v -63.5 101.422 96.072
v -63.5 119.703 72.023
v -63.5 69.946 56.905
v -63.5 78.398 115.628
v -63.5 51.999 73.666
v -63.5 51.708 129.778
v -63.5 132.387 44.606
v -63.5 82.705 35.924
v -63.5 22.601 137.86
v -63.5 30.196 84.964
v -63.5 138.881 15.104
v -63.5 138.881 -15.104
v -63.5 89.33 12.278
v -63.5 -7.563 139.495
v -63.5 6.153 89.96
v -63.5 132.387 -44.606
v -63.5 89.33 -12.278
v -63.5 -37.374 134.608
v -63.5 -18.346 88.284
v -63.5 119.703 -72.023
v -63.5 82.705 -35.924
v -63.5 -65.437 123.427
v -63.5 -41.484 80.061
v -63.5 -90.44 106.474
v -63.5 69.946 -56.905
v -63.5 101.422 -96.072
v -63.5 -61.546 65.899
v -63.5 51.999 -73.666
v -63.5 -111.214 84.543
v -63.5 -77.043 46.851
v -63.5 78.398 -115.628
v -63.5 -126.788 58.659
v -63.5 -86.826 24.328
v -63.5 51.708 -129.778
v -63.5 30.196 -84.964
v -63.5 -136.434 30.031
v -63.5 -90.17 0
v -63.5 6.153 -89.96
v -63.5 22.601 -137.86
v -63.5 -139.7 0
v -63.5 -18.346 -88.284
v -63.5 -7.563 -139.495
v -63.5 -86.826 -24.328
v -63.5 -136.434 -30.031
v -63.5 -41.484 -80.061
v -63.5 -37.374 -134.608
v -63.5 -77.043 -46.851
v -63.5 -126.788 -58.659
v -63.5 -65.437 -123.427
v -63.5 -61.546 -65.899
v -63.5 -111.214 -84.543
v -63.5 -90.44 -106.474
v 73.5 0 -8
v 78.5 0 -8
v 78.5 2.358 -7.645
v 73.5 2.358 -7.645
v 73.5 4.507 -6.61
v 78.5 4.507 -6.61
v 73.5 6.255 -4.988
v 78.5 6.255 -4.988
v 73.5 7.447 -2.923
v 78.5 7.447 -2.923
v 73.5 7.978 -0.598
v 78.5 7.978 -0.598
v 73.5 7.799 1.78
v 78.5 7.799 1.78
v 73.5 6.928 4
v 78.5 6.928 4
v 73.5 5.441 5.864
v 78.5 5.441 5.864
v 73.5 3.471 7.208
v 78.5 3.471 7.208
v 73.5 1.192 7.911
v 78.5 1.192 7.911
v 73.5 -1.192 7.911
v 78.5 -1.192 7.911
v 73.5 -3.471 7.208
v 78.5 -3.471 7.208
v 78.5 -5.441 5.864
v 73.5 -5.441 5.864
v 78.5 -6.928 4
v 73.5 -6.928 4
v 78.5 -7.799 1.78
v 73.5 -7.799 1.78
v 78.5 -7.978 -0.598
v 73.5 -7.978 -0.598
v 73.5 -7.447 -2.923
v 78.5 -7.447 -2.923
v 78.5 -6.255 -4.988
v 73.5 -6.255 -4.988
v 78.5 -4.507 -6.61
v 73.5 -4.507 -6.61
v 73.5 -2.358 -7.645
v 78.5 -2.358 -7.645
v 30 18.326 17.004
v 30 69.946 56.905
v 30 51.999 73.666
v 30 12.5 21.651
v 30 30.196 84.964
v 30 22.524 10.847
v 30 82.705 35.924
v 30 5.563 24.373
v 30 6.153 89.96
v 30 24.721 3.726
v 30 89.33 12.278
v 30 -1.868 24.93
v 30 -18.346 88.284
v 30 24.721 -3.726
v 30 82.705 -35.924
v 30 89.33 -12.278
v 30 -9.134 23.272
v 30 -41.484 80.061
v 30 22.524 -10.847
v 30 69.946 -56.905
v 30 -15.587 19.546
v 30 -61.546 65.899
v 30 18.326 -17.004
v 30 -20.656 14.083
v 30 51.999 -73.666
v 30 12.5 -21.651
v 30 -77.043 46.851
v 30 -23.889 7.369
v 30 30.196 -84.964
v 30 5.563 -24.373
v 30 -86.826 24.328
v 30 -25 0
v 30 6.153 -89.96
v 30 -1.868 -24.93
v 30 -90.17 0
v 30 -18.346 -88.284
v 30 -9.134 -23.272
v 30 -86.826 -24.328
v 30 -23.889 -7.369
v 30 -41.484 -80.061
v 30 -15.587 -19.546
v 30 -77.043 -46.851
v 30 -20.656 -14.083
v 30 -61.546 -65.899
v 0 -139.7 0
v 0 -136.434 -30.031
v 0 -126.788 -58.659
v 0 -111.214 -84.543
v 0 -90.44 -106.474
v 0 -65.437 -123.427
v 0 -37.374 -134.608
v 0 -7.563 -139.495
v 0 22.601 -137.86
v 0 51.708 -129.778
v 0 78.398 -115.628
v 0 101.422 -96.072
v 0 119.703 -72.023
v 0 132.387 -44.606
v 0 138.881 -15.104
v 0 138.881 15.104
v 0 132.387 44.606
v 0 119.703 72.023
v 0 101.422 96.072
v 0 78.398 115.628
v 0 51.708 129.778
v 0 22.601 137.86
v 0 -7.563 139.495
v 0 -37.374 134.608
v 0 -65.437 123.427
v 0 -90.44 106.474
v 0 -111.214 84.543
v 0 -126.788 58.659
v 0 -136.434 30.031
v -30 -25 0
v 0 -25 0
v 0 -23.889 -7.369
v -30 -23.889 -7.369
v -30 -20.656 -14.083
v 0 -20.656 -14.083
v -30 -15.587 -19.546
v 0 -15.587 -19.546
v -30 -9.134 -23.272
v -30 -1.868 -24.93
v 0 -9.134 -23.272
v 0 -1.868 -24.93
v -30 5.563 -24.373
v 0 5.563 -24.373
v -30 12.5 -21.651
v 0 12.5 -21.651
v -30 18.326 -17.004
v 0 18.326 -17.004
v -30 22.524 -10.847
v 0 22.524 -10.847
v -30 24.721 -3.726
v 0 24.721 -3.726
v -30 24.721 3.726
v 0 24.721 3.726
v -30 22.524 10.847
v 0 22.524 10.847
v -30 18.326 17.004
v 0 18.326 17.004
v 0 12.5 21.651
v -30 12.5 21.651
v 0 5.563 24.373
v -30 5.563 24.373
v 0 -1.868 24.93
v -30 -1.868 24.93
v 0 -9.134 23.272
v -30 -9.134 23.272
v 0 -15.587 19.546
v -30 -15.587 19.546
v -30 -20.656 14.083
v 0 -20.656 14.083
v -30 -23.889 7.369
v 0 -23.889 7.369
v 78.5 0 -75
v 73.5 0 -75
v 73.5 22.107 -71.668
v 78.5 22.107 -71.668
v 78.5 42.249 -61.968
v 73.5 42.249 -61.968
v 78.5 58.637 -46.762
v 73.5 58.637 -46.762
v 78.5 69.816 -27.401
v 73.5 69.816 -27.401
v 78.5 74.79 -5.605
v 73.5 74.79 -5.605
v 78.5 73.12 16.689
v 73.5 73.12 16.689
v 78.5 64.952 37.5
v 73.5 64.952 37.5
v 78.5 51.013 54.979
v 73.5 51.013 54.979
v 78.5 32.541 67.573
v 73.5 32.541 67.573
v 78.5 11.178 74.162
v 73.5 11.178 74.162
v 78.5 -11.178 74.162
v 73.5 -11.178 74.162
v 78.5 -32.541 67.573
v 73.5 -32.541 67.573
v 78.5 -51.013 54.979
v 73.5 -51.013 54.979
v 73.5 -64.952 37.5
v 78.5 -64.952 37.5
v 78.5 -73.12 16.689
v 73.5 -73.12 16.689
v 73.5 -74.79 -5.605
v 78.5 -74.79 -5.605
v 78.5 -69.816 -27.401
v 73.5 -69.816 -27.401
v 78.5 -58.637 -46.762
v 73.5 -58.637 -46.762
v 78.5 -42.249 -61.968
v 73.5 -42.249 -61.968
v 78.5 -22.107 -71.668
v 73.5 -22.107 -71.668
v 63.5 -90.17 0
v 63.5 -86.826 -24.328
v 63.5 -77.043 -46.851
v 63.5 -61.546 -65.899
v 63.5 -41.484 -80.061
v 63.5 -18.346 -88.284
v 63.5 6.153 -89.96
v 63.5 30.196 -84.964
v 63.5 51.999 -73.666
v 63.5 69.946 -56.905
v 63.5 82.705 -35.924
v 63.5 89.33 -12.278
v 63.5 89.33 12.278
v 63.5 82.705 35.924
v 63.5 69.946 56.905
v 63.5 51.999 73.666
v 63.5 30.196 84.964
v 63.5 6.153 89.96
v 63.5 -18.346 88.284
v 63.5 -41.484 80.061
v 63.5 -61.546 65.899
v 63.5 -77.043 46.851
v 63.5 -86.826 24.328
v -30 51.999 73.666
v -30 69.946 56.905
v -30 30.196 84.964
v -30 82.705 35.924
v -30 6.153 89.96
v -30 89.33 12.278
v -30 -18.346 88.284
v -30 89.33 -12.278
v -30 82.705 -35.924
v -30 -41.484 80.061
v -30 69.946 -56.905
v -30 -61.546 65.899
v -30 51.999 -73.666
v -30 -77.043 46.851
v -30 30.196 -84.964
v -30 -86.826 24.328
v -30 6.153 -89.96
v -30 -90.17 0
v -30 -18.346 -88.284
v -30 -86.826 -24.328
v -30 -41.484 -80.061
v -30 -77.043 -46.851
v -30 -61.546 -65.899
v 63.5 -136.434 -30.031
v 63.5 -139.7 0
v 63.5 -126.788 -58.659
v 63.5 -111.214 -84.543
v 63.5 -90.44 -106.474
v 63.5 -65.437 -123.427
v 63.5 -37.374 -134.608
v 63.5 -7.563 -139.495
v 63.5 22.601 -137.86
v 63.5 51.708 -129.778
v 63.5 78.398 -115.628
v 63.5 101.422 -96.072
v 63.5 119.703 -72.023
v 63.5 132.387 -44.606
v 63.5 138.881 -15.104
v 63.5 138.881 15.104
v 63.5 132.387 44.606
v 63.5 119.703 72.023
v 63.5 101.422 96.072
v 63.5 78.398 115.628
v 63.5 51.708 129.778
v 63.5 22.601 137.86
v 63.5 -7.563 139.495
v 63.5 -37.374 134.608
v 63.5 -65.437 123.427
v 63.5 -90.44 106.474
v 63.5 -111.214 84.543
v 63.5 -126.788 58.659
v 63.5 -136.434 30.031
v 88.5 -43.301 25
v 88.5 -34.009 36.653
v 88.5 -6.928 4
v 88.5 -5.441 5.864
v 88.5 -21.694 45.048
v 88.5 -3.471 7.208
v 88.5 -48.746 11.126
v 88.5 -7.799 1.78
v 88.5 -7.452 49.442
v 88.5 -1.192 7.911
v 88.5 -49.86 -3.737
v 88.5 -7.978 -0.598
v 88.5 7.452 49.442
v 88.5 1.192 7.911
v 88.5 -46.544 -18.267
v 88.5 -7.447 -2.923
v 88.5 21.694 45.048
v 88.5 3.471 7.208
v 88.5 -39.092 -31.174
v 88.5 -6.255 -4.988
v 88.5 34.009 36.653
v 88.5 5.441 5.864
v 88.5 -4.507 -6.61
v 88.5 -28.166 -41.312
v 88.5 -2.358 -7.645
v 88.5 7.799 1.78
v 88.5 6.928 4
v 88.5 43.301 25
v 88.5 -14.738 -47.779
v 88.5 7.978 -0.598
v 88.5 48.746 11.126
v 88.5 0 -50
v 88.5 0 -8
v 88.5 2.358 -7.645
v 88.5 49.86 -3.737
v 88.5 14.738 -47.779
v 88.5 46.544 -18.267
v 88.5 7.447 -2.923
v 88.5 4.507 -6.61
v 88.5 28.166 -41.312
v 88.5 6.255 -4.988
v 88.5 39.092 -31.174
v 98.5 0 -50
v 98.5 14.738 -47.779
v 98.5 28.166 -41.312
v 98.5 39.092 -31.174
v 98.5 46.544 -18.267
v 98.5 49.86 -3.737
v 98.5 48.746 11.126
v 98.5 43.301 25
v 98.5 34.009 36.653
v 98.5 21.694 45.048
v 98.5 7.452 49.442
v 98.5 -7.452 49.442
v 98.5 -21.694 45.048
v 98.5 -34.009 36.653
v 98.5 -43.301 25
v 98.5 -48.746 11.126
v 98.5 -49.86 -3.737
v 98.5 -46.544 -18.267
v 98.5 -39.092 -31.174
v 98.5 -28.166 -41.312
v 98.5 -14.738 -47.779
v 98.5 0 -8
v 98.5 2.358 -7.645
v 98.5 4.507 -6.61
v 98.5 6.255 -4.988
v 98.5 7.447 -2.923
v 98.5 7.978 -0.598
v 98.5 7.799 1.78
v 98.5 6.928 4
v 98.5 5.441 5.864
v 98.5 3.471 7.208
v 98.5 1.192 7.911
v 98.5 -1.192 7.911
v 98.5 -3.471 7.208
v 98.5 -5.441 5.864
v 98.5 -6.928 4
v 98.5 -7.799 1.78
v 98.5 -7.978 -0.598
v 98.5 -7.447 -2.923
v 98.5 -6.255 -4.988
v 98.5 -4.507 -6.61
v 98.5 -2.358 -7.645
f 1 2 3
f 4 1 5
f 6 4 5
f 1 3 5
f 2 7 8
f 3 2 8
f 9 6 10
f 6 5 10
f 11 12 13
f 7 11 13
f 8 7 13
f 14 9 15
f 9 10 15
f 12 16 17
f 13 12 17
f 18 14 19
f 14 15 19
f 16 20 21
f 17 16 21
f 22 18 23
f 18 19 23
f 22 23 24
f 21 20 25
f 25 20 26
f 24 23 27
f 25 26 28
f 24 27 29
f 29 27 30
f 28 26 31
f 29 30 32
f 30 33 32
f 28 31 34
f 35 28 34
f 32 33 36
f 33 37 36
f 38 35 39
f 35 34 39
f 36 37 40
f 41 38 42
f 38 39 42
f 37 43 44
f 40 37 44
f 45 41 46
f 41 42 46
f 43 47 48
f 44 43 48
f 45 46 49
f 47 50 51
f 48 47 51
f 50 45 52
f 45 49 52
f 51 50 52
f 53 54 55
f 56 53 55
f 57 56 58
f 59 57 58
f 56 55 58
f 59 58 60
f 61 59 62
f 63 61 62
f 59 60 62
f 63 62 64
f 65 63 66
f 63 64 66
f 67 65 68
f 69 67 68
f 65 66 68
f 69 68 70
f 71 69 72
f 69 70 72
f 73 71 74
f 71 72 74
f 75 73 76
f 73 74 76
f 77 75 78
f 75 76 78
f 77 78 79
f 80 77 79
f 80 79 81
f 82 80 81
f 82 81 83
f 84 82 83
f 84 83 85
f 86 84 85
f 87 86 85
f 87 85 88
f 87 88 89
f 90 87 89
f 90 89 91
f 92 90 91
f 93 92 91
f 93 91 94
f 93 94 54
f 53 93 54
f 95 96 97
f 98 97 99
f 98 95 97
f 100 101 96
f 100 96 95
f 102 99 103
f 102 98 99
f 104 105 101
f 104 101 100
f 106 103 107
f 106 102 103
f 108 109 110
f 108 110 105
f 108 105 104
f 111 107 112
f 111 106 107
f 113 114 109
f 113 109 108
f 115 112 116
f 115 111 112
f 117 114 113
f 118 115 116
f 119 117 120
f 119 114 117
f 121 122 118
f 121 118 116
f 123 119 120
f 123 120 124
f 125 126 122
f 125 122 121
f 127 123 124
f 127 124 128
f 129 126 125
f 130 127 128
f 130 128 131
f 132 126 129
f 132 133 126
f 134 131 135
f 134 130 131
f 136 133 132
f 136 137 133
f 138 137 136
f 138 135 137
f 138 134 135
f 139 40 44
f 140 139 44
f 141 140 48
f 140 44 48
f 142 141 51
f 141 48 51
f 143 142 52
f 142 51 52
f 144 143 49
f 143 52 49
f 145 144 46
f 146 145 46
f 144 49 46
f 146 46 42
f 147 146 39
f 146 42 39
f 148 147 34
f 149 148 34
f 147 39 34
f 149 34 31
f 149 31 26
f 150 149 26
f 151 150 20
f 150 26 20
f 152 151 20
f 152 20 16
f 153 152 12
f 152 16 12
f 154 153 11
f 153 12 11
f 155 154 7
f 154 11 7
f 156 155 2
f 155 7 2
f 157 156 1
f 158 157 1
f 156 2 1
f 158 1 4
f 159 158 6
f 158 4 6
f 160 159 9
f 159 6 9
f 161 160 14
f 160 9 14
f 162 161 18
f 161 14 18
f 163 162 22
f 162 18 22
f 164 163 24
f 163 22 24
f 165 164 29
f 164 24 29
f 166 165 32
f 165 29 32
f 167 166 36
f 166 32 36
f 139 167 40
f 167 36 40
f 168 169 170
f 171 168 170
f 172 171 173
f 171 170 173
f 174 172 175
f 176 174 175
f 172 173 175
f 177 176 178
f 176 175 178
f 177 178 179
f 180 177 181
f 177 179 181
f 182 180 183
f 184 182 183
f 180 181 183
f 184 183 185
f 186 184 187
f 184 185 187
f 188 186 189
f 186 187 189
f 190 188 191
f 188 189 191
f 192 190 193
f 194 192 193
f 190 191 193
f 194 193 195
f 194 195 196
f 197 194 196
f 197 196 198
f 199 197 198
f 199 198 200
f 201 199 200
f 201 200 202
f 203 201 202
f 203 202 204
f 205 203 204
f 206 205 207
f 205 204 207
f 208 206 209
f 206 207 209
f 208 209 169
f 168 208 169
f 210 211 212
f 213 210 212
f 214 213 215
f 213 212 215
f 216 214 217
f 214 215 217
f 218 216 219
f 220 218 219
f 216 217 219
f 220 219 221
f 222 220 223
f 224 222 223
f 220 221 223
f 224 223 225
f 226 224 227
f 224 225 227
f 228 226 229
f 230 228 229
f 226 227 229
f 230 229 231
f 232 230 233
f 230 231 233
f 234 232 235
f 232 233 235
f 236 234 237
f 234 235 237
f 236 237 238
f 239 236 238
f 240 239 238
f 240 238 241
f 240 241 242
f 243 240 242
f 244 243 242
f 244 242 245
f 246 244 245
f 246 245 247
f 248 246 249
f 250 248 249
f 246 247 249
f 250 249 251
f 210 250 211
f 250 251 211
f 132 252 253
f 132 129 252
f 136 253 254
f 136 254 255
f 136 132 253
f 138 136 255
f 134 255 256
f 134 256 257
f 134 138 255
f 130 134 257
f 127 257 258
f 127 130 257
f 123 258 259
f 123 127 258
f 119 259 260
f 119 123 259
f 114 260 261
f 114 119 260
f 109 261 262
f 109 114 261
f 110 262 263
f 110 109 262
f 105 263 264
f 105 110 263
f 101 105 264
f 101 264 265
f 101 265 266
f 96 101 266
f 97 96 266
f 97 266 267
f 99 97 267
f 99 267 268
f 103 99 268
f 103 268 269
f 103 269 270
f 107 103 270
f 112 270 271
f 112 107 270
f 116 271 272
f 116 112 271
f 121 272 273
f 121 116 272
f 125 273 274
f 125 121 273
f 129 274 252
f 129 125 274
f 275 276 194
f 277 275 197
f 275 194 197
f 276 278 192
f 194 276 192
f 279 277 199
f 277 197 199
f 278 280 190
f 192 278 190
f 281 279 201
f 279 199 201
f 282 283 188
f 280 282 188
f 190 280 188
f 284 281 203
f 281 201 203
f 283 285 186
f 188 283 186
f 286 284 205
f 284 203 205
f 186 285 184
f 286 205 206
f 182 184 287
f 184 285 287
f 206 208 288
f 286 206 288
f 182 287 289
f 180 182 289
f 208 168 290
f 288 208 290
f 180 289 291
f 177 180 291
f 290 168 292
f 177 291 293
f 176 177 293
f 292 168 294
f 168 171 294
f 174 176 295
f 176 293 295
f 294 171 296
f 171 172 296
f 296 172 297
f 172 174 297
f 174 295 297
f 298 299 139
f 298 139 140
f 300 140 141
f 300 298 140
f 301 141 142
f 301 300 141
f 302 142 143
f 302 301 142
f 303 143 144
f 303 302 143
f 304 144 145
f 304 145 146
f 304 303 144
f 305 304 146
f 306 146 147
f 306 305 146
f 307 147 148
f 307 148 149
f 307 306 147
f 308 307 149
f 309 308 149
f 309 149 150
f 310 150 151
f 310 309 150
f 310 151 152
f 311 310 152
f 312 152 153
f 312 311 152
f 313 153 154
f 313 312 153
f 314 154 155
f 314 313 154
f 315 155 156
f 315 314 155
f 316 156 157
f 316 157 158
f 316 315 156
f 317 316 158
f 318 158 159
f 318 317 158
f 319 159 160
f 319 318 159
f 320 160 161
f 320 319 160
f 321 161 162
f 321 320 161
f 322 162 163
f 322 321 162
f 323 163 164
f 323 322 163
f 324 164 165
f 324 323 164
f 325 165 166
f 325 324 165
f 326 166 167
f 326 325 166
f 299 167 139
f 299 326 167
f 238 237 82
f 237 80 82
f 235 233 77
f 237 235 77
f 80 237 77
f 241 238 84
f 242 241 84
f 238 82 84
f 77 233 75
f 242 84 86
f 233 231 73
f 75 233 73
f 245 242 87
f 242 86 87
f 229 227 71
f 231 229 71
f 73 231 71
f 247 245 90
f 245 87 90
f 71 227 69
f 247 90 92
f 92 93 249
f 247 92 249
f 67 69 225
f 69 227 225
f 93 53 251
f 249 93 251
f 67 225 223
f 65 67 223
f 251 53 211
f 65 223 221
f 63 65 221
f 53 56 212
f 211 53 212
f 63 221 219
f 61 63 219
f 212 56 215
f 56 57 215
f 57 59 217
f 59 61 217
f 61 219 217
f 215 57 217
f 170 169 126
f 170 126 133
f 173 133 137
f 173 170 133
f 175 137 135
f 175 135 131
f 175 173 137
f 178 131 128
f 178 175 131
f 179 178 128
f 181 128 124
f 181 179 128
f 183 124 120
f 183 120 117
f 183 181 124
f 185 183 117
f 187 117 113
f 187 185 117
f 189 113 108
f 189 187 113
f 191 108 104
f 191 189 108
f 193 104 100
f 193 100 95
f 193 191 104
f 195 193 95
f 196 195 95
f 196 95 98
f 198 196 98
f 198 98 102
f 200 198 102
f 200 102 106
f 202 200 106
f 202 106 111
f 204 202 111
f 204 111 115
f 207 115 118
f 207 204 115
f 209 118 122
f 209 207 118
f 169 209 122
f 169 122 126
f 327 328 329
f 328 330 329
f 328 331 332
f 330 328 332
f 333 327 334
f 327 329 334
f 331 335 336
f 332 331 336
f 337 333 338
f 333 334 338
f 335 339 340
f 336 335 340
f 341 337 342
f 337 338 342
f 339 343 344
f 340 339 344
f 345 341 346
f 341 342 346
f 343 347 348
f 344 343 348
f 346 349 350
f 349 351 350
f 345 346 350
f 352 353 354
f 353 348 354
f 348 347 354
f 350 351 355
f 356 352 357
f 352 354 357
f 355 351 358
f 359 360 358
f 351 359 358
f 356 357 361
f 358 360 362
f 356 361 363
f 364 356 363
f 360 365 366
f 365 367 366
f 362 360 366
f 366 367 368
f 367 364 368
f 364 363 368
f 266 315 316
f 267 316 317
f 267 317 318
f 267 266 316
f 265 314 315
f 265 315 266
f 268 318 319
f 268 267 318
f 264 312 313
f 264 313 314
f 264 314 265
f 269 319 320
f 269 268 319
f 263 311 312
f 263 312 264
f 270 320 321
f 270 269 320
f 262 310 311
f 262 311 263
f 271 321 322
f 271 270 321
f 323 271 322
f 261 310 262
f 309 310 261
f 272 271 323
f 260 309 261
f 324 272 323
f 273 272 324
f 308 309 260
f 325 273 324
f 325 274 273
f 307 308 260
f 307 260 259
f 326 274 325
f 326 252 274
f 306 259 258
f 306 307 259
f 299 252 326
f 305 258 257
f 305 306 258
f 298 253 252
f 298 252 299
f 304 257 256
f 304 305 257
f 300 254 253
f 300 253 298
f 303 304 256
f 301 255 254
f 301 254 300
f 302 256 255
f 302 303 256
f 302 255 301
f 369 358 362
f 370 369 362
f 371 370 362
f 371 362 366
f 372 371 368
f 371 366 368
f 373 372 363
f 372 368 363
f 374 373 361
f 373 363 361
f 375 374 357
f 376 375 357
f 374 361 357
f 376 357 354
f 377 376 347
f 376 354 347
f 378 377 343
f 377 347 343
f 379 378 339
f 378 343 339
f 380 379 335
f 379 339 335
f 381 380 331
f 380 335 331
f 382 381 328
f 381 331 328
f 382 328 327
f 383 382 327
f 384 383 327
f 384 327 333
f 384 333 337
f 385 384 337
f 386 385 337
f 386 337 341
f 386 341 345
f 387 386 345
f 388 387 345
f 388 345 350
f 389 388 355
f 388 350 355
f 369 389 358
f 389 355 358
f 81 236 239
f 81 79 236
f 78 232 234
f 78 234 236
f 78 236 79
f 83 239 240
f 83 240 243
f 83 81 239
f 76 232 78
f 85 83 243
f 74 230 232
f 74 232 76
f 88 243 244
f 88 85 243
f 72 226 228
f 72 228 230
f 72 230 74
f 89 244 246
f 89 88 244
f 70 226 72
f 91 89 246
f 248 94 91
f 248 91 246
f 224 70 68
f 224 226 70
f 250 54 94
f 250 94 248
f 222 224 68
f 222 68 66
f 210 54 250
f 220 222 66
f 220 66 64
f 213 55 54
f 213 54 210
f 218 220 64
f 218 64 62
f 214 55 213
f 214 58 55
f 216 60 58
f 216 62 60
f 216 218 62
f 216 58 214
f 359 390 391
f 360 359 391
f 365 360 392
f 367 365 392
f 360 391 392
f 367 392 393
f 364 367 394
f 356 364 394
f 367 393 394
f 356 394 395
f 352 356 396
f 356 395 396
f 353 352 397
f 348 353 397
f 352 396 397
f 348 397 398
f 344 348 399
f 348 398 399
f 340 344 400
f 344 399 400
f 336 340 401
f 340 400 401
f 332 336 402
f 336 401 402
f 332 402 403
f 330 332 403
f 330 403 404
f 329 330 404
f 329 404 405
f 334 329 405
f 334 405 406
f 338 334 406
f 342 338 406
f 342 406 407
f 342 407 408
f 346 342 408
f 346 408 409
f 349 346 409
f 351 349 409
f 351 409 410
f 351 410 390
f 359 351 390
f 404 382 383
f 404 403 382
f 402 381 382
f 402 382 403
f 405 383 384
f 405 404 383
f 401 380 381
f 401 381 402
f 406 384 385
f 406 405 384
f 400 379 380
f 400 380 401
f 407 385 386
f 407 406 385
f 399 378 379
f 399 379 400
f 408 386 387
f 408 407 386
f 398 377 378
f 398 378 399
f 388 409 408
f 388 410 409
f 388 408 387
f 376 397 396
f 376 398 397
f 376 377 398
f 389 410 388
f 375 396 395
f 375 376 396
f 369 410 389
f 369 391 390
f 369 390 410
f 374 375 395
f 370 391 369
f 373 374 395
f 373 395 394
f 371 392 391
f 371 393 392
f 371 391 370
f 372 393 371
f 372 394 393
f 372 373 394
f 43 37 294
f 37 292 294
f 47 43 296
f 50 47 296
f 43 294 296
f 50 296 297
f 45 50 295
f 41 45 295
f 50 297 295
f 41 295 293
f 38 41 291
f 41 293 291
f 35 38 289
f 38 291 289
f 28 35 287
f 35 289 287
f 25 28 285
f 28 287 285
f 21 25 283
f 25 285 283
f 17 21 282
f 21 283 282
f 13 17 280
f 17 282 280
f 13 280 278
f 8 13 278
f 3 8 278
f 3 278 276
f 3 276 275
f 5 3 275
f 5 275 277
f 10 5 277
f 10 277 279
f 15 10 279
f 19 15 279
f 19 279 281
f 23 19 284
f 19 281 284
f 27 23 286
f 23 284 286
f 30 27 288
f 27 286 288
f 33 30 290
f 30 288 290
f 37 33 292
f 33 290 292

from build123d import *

# Parameters (mm, degrees)
BOSS_EXTRUDE1_START = 10
SKETCH2_R           = 75
BOSS_EXTRUDE1_DEPTH = 5
BOSS_EXTRUDE2_START = 10
SKETCH3_R           = 50
BOSS_EXTRUDE2_DEPTH = 10
SKETCH4_R           = 8
CUT_EXTRUDE1_DEPTH  = 163


with BuildPart() as part:
    # Sketch1 → Revolve1 (revolve)
    with BuildSketch(Plane.XY):
        Polygon((0, -25), (0, -139.7), (-63.5, -139.7), (-63.5, -90.17), (-30, -90.17), (-30, -25), align=None)
    revolve1 = revolve(axis=Axis((-62.857142857, 0, 0), (1, 0, 0)))

    # Mirror1: Revolve1 across plane
    add(revolve1.mirror(Plane(origin=(0, 0, 0), x_dir=(0, 0, 1), z_dir=(1, 0, 0))))


with BuildPart() as body_2:
    # Sketch2 → Boss-Extrude1 (new body)
    with BuildSketch(Plane(origin=(63.5, 0, 0), x_dir=(0, 0, -1), z_dir=(1, 0, 0)).offset(BOSS_EXTRUDE1_START)):
        Circle(SKETCH2_R)
    extrude(amount=BOSS_EXTRUDE1_DEPTH)


with BuildPart() as body_3:
    # Sketch3 → Boss-Extrude2 (new body)
    with BuildSketch(Plane(origin=(78.5, 0, 0), x_dir=(0, 0, -1), z_dir=(1, 0, 0)).offset(BOSS_EXTRUDE2_START)):
        Circle(SKETCH3_R)
    extrude(amount=BOSS_EXTRUDE2_DEPTH)


with BuildPart() as cut_extrude1_tool:
    # Sketch4 → Cut-Extrude1 (new body, through all)
    with BuildSketch(Plane(origin=(98.5, 0, 0), x_dir=(0, 0, -1), z_dir=(1, 0, 0))):
        Circle(SKETCH4_R)
    extrude(amount=-CUT_EXTRUDE1_DEPTH)


with BuildPart() as body_2_1:
    add(body_2.part)

    # Cut-Extrude1: cut by cut_extrude1_tool
    add(cut_extrude1_tool.part, mode=Mode.SUBTRACT)


with BuildPart() as body_3_1:
    add(body_3.part)

    # Cut-Extrude1: cut by cut_extrude1_tool
    add(cut_extrude1_tool.part, mode=Mode.SUBTRACT)


solid = Compound([part.part, body_2_1.part, body_3_1.part])
